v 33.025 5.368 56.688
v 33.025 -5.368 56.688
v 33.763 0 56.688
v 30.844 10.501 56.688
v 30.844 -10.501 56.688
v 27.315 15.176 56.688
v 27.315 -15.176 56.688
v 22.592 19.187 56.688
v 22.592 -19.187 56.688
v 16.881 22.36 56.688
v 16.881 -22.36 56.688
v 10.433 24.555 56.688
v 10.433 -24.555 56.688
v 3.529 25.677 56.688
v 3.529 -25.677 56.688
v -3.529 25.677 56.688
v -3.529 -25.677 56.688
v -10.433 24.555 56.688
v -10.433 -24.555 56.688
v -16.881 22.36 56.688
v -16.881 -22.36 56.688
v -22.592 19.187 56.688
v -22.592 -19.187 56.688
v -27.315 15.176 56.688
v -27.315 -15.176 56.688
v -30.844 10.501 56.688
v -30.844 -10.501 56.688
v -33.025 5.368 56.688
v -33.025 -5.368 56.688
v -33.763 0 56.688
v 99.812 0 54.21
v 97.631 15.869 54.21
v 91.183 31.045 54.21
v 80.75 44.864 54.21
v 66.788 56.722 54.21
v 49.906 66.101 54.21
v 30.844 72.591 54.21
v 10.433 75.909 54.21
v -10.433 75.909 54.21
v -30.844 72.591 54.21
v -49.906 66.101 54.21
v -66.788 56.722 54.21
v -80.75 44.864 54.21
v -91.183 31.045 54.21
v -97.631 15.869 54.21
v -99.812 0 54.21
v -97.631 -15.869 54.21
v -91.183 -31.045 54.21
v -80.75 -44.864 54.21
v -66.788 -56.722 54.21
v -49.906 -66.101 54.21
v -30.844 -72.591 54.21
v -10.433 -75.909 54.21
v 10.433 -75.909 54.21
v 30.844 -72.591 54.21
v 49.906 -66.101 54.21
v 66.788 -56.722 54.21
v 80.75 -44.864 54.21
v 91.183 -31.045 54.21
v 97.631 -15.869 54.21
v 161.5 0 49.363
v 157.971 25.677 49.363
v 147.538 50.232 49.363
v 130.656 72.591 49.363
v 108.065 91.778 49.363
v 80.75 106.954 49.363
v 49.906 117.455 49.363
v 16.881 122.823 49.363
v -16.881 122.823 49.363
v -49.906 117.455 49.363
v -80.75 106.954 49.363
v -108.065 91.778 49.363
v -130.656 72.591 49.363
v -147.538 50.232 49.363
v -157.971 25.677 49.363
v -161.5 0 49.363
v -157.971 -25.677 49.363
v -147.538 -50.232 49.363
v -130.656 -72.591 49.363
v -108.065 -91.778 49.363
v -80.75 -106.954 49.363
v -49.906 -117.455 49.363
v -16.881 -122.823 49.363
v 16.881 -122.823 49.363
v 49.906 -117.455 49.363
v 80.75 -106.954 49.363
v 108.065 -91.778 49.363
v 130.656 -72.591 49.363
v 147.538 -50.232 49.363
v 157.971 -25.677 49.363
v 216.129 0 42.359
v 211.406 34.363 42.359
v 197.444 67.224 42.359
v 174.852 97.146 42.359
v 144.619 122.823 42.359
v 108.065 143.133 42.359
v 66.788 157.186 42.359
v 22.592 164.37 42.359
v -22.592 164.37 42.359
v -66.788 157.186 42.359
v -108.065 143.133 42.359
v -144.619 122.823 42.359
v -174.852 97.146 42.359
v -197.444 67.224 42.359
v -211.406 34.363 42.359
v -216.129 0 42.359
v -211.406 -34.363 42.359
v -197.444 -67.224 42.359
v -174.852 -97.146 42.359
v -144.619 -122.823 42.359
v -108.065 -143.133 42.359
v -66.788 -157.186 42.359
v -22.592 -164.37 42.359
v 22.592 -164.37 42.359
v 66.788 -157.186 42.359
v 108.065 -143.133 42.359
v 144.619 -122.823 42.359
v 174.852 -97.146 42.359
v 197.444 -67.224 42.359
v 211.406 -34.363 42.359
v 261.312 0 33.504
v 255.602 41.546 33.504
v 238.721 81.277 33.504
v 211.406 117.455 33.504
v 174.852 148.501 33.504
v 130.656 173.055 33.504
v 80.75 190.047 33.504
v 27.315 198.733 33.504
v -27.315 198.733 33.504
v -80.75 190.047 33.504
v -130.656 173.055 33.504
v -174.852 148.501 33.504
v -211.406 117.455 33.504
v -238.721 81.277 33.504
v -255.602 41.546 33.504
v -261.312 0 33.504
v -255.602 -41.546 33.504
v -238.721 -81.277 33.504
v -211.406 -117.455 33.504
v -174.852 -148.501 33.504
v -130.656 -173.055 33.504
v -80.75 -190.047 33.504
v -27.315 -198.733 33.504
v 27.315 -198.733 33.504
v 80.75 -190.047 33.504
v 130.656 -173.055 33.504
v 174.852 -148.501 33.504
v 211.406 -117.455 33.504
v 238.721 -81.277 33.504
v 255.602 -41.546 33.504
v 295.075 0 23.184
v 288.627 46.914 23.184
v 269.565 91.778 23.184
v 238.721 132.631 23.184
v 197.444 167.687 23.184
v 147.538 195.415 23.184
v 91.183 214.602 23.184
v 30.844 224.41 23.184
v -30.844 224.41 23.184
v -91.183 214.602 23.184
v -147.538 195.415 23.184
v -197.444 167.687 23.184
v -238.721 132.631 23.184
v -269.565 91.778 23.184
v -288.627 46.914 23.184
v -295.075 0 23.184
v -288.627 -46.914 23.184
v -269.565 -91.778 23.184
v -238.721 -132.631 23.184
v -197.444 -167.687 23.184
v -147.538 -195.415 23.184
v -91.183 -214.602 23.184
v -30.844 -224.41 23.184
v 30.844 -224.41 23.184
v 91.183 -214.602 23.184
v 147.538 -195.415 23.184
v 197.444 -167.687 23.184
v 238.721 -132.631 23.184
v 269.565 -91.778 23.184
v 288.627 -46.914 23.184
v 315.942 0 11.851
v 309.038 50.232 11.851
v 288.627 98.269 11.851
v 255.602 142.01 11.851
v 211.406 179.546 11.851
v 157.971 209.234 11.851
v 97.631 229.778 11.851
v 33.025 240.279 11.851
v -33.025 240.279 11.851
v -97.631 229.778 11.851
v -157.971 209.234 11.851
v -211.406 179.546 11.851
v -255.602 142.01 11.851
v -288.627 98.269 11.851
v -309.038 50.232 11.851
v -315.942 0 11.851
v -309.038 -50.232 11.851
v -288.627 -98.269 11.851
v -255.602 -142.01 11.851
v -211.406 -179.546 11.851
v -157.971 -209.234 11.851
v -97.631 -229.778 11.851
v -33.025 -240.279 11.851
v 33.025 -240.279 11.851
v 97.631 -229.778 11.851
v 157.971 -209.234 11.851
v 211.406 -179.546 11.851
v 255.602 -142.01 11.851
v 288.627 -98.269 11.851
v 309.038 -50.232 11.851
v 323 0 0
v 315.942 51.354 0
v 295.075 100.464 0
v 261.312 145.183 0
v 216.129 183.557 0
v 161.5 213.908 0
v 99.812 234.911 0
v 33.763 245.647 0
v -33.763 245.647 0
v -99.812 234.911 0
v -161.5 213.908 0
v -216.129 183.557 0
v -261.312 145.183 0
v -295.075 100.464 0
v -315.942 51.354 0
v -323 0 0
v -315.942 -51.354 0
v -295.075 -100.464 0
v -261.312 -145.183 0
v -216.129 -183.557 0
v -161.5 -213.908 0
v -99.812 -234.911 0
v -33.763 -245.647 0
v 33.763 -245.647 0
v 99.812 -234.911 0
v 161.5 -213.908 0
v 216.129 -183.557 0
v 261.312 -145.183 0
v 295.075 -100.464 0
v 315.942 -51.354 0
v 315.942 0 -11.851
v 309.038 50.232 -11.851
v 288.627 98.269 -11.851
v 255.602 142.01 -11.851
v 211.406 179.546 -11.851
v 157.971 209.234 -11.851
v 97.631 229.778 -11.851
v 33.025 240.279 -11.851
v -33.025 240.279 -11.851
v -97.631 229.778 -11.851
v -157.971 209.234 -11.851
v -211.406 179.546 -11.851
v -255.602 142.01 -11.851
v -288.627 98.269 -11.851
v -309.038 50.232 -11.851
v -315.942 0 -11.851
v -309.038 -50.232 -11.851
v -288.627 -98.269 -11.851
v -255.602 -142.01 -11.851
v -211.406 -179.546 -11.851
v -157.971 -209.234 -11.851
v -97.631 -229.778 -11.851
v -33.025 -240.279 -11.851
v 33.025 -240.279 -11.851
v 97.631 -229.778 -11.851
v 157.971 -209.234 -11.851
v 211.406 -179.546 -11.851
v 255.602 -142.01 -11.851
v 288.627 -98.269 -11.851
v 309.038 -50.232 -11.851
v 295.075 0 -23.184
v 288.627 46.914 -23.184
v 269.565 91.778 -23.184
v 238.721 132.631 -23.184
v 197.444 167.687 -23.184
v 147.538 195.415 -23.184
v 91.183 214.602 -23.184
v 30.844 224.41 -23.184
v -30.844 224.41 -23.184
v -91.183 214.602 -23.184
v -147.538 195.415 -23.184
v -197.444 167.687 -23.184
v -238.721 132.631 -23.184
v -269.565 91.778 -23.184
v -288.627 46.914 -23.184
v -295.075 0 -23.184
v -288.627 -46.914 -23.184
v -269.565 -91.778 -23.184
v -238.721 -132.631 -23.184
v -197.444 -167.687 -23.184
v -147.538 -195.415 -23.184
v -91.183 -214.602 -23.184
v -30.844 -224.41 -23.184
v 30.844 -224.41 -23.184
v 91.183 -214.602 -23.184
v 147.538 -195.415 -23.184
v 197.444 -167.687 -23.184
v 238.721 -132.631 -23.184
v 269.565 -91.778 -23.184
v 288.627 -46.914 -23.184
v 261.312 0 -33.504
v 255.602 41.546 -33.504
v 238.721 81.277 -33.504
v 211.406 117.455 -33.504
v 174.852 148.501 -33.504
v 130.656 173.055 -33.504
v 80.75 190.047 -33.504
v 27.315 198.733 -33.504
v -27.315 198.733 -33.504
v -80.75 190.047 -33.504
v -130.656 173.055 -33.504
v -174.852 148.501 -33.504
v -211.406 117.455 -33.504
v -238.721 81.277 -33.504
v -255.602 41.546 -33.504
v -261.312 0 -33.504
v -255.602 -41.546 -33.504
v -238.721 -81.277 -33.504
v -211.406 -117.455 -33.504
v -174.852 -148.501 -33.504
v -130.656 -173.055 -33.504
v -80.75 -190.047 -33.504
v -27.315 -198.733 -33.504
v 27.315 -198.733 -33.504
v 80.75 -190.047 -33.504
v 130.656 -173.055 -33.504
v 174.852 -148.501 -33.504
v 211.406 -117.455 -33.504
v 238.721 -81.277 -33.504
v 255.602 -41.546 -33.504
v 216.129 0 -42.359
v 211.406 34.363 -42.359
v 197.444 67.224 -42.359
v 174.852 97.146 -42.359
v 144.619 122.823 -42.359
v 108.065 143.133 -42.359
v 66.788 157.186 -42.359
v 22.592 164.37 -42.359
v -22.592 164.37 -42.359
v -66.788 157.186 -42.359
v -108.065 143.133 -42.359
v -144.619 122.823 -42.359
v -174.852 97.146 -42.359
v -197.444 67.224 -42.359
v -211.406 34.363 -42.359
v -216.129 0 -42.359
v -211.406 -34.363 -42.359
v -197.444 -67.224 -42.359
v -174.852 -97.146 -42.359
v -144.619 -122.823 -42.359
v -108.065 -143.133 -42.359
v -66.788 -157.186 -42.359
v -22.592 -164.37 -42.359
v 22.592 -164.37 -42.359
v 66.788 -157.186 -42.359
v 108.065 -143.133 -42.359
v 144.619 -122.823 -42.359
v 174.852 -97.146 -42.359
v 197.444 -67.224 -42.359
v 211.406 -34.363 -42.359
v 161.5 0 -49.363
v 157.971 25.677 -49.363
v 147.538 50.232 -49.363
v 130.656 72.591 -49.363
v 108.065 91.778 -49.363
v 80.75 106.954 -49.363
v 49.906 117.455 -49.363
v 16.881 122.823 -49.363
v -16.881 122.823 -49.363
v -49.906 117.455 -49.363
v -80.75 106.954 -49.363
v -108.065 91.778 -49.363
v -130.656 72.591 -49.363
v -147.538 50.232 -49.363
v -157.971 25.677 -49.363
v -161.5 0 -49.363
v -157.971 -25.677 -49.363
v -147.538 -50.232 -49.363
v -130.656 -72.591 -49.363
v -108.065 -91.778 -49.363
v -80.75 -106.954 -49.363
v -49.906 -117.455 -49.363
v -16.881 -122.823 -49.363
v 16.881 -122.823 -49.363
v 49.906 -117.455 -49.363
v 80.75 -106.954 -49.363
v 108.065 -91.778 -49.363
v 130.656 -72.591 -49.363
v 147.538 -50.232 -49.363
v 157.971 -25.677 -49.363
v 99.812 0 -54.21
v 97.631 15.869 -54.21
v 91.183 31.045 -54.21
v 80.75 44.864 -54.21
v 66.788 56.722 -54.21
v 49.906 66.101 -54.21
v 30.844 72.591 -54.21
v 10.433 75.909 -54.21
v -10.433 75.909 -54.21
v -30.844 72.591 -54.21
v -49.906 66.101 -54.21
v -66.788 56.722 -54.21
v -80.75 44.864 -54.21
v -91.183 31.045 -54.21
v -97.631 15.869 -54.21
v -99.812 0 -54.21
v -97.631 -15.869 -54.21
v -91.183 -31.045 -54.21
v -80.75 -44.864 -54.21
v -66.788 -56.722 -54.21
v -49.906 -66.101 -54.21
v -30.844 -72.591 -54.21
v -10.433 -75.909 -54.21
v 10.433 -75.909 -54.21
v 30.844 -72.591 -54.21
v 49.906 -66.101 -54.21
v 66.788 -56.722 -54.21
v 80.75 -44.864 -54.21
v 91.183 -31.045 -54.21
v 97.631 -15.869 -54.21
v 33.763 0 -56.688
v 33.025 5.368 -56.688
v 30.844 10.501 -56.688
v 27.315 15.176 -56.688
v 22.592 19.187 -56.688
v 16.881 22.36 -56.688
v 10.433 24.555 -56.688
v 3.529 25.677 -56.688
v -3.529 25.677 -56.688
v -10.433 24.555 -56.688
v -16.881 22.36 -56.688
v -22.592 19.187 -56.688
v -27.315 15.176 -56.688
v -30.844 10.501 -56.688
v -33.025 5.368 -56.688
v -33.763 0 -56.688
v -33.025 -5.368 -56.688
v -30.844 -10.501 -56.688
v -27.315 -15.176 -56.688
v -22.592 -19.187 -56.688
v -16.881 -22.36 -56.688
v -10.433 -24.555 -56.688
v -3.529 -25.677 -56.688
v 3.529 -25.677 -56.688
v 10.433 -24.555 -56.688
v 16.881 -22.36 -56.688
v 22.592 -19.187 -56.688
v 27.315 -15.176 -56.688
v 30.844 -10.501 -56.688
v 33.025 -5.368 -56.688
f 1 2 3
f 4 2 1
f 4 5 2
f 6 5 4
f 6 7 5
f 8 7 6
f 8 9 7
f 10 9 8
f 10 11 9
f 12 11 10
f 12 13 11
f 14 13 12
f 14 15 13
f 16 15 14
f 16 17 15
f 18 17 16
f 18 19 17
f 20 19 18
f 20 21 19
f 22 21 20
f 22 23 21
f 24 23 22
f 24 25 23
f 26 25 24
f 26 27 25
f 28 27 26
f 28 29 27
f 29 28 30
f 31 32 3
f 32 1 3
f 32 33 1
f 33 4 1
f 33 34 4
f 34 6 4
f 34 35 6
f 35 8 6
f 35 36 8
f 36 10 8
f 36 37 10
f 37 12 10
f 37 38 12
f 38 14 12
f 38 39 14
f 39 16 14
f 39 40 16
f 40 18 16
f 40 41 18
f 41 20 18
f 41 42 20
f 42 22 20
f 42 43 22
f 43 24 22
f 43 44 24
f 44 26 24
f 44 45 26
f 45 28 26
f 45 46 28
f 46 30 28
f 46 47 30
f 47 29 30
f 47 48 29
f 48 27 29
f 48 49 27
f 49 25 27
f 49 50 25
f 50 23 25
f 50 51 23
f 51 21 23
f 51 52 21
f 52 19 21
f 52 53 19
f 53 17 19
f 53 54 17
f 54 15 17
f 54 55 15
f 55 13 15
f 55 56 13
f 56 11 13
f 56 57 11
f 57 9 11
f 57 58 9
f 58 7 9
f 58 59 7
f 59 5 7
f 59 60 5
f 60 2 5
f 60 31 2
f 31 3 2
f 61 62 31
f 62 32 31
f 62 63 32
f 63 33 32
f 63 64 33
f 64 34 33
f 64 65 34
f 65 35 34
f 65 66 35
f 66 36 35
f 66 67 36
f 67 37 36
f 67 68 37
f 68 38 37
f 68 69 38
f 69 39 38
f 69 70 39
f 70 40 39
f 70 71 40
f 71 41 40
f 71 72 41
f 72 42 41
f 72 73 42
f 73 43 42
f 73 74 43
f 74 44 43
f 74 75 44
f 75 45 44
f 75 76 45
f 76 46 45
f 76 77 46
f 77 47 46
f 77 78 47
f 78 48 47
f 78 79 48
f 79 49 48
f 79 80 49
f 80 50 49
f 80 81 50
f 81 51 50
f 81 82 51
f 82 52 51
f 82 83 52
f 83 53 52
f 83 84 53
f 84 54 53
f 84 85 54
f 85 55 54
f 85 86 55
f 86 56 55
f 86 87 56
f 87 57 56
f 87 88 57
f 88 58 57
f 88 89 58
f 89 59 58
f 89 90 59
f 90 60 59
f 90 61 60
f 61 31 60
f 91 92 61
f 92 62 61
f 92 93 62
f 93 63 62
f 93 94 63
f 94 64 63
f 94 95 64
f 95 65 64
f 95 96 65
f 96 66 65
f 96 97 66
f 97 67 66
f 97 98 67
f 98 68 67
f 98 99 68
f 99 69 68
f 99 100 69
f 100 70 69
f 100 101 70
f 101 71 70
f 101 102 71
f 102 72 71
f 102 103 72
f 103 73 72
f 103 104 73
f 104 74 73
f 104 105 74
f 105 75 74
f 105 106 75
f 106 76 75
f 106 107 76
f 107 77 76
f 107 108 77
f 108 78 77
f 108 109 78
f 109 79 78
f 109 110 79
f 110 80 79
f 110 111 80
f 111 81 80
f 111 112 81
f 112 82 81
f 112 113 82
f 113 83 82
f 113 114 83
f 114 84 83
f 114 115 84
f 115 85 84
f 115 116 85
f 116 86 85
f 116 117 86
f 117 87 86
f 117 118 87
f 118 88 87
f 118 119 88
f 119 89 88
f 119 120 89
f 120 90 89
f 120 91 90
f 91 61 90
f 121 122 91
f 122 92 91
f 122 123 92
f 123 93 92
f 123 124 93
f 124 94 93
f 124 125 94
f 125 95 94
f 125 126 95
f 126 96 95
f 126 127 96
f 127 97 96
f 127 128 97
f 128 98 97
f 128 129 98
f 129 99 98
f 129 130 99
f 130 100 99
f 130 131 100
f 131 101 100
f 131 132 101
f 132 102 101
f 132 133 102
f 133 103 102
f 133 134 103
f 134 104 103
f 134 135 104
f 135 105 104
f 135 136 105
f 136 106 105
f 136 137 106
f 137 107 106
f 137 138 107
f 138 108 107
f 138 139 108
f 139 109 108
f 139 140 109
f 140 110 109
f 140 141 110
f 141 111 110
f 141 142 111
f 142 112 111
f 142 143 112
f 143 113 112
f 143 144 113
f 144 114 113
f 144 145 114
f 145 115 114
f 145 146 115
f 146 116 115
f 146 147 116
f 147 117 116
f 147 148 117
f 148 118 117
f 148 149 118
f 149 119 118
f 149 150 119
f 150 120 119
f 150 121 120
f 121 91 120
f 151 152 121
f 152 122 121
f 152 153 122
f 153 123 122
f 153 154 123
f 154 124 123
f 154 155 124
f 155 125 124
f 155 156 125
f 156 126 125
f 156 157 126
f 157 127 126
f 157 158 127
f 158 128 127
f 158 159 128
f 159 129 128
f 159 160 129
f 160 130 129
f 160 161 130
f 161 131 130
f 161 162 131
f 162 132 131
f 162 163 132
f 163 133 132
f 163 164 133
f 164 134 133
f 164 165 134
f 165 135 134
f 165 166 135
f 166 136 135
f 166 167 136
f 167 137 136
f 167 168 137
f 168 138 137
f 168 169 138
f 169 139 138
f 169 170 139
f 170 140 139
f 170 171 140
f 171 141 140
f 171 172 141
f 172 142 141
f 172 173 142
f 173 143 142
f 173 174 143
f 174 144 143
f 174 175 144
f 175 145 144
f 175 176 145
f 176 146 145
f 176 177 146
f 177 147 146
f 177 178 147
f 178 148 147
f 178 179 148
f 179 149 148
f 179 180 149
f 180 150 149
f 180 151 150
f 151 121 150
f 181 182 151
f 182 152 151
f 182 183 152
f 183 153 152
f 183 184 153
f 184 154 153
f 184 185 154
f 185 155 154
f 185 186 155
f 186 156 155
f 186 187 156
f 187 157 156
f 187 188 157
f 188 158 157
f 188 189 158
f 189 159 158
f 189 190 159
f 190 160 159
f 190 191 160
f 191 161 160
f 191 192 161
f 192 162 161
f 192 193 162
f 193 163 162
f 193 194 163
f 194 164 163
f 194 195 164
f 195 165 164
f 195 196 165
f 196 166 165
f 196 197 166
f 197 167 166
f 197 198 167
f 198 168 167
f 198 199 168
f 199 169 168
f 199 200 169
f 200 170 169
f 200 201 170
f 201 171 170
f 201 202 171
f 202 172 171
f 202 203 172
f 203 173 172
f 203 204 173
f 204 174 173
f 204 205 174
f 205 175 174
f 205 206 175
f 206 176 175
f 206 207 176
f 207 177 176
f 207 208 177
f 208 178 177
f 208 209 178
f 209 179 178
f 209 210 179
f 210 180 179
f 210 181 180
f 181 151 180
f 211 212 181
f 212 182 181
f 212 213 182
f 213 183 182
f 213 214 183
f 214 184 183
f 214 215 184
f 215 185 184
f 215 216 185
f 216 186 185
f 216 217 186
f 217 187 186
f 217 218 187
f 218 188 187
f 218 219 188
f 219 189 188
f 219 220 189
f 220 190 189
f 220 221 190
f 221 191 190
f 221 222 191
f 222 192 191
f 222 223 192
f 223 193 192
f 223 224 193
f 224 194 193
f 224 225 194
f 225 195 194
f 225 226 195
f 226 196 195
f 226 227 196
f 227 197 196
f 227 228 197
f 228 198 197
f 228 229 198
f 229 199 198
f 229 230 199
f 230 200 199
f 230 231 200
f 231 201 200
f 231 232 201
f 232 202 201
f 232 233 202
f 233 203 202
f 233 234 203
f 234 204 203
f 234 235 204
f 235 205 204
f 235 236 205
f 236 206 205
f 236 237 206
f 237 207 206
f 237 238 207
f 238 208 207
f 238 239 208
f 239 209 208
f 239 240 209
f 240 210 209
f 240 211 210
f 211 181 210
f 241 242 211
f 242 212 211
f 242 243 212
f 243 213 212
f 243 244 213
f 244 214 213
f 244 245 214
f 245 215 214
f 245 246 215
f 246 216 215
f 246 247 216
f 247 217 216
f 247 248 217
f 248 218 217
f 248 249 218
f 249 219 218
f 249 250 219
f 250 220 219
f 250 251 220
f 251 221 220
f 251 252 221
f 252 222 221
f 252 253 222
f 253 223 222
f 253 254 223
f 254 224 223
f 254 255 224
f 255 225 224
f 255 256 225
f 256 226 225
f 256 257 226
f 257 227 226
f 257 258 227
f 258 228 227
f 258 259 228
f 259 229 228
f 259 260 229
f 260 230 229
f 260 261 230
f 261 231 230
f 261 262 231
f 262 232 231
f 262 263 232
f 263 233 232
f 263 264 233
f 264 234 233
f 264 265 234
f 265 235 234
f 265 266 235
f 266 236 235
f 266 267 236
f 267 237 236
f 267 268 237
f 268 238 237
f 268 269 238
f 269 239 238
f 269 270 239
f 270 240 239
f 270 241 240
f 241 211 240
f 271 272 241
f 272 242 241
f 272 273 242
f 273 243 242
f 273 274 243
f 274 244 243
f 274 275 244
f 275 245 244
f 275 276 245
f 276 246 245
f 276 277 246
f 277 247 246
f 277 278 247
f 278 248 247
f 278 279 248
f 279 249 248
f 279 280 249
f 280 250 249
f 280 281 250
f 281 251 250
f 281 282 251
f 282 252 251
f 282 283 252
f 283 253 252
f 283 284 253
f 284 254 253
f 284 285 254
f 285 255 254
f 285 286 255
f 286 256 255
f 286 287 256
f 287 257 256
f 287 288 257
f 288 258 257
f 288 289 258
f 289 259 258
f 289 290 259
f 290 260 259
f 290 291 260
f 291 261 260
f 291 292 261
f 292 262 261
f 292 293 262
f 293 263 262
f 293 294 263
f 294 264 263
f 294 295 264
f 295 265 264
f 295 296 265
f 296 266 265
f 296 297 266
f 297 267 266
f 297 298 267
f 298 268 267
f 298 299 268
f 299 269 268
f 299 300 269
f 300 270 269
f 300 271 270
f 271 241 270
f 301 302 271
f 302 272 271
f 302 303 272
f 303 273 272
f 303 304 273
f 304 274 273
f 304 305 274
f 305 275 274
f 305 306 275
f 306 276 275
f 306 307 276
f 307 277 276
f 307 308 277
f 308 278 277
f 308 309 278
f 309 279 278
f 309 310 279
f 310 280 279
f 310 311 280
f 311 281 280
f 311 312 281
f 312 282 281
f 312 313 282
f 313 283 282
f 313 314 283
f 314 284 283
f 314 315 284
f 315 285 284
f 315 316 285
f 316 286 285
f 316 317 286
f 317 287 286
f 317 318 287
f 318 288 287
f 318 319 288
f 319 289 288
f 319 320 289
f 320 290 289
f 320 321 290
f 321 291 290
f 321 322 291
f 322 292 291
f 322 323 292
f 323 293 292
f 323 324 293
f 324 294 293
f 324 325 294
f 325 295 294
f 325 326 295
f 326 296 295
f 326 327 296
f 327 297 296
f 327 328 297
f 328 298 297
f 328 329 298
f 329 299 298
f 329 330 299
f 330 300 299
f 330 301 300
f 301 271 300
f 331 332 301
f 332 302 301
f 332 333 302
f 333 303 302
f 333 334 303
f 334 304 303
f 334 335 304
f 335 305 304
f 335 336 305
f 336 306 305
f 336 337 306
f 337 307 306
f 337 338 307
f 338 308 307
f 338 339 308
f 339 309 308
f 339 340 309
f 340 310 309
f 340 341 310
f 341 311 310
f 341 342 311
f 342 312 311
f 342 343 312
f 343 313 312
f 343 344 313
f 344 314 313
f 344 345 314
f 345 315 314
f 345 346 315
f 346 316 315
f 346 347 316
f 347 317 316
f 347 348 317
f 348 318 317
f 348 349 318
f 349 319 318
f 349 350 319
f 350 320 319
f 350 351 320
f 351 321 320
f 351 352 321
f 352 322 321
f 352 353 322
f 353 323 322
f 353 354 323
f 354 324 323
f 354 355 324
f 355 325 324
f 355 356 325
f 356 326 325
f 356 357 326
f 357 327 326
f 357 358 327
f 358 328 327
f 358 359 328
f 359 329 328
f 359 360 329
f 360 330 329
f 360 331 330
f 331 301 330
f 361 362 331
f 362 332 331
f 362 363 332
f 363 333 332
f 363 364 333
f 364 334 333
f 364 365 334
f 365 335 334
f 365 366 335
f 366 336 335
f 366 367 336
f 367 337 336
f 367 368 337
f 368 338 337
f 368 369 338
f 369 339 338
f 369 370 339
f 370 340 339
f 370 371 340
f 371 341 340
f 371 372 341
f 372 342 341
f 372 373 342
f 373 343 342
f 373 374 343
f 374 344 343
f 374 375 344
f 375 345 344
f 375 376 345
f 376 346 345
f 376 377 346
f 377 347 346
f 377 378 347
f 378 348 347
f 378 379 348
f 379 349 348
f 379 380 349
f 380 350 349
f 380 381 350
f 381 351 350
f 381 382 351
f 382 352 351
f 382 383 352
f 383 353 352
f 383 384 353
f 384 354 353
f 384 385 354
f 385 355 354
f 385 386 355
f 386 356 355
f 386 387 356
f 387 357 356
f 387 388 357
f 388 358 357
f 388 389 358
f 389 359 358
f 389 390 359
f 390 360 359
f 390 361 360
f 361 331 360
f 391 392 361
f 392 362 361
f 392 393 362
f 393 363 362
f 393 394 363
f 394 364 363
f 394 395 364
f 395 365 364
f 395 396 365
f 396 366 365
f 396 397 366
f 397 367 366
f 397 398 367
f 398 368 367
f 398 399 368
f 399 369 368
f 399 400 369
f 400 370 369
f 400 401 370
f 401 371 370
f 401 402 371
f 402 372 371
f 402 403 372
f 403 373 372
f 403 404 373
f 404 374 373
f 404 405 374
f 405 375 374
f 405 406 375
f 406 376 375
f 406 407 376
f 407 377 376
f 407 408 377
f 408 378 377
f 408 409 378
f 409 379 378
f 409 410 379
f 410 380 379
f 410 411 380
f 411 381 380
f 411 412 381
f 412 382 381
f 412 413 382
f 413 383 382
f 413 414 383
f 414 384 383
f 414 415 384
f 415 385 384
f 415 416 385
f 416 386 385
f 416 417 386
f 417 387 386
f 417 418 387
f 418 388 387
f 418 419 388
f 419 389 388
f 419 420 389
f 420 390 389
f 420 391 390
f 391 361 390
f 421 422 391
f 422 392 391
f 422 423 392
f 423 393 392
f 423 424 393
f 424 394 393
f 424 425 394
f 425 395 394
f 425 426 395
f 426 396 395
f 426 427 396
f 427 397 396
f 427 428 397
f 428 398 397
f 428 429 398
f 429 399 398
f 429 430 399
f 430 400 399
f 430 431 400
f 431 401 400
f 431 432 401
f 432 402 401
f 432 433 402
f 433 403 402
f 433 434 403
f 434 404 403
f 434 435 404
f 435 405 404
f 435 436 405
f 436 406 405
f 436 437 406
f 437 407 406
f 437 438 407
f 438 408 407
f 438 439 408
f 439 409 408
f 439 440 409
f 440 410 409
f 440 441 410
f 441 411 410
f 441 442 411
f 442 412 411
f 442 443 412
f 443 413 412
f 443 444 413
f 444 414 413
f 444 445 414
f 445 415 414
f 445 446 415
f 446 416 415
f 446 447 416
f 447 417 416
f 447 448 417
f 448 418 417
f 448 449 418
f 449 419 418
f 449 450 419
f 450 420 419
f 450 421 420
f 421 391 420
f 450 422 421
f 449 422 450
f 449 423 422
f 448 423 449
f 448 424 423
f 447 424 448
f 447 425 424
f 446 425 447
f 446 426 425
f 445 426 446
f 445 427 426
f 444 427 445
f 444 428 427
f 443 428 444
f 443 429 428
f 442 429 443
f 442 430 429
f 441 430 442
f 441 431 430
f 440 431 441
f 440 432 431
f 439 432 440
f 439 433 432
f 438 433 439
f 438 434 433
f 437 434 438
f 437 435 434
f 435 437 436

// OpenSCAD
// Generated by SolidPython 1.0.1 on 2020-07-29 00:46:53


scale(v = [17, 13, 3]) {
	sphere(r = 19);
}
/***********************************************
*********      SolidPython code:      **********
************************************************
 
# import packages: SolidPython
from solid import *
from solid.utils import *
from itertools import chain, combinations, permutations


class Resize:

    def __init__(self, scad_file):
        self.scad_file = scad_file
        #self.scad_file = import_scad(scad_file)
        # cone/cylinder param:
        self.r1 = 0
        self.r2 = 0
        self.h = 0
        # rectangular prism param:
        self.w = 0
        self.l = 0
        # ellipse param:
        self.r = 0

    # import OpenScad code (file name corresponds to shape)


    # classify shape + parameters
    def assign(self, param1, param2, param3):
        if self.scad_file == 'cone.scad':
            self.r1 = param1
            self.r2 = param2
            self.h = param3
        elif self.scad_file == 'cylinder.scad':
            self.r1 = param1
            self.r2 = param2
            self.h = param3
        elif self.scad_file == 'rectangularPrism.scad':
            self.h = param1
            self.l = param2
            self.w = param3
        else:
            self.r = param1
            self.h = param2

    # resize parameters
    def iterate(self):
        x = range(3, 20, 2)
        i = 1
        if self.scad_file == 'cone.scad':
            tempList = list(permutations(x, 2))
            for temp in tempList:
                param1 = temp[0]
                param2 = temp[1]
                filepath = 'produced_scad_files/' + 'cone' + str(param1) + '_' + str(param2) + '_' + '.scad'
                scad_render_to_file(cylinder(h=param1, r1=param2, r2=0), filepath)

        elif self.scad_file == 'cylinder.scad':
            tempList = list(permutations(x, 3))
            for temp in tempList:
                param1 = temp[0]
                param2 = temp[1]
                filepath = 'produced_scad_files/' + 'cylinder' + str(param1) + '_' + str(param2) + '_' + '.scad'
                scad_render_to_file(cylinder(h=param1, r1=param2, r2=param2), filepath)

        elif self.scad_file == 'rectangularPrism.scad':
            tempList = list(permutations(x, 3))
            for temp in tempList:
                param1 = temp[0]
                param2 = temp[1]
                param3 = temp[2]
                filepath = 'produced_scad_files/' + 'rectangularPrism' + str(param1) + '_' + str(param2) + '_' + str(
                    param3) + '.scad'
                scad_render_to_file(cube(size=(param1, param2, param3)), filepath)

        elif self.scad_file == 'ellipse.scad':
            tempList = list(permutations(x, 4))
            for temp in tempList:
                param1 = temp[0]
                param2 = temp[1]
                param3 = temp[2]
                param4 = temp[3]
                filepath = 'produced_scad_files/' + 'ellipse' + str(param1) + '_' + str(param2) + '_' + str(param3) + '_' + str(param4) + '.scad'
                scad_render_to_file(scale([param1, param2, param3])(sphere(r=param4)), filepath)

    def render_to_scadfile(self):
        scad_render_to_file(scad, 'example.scad') 
 
************************************************/
